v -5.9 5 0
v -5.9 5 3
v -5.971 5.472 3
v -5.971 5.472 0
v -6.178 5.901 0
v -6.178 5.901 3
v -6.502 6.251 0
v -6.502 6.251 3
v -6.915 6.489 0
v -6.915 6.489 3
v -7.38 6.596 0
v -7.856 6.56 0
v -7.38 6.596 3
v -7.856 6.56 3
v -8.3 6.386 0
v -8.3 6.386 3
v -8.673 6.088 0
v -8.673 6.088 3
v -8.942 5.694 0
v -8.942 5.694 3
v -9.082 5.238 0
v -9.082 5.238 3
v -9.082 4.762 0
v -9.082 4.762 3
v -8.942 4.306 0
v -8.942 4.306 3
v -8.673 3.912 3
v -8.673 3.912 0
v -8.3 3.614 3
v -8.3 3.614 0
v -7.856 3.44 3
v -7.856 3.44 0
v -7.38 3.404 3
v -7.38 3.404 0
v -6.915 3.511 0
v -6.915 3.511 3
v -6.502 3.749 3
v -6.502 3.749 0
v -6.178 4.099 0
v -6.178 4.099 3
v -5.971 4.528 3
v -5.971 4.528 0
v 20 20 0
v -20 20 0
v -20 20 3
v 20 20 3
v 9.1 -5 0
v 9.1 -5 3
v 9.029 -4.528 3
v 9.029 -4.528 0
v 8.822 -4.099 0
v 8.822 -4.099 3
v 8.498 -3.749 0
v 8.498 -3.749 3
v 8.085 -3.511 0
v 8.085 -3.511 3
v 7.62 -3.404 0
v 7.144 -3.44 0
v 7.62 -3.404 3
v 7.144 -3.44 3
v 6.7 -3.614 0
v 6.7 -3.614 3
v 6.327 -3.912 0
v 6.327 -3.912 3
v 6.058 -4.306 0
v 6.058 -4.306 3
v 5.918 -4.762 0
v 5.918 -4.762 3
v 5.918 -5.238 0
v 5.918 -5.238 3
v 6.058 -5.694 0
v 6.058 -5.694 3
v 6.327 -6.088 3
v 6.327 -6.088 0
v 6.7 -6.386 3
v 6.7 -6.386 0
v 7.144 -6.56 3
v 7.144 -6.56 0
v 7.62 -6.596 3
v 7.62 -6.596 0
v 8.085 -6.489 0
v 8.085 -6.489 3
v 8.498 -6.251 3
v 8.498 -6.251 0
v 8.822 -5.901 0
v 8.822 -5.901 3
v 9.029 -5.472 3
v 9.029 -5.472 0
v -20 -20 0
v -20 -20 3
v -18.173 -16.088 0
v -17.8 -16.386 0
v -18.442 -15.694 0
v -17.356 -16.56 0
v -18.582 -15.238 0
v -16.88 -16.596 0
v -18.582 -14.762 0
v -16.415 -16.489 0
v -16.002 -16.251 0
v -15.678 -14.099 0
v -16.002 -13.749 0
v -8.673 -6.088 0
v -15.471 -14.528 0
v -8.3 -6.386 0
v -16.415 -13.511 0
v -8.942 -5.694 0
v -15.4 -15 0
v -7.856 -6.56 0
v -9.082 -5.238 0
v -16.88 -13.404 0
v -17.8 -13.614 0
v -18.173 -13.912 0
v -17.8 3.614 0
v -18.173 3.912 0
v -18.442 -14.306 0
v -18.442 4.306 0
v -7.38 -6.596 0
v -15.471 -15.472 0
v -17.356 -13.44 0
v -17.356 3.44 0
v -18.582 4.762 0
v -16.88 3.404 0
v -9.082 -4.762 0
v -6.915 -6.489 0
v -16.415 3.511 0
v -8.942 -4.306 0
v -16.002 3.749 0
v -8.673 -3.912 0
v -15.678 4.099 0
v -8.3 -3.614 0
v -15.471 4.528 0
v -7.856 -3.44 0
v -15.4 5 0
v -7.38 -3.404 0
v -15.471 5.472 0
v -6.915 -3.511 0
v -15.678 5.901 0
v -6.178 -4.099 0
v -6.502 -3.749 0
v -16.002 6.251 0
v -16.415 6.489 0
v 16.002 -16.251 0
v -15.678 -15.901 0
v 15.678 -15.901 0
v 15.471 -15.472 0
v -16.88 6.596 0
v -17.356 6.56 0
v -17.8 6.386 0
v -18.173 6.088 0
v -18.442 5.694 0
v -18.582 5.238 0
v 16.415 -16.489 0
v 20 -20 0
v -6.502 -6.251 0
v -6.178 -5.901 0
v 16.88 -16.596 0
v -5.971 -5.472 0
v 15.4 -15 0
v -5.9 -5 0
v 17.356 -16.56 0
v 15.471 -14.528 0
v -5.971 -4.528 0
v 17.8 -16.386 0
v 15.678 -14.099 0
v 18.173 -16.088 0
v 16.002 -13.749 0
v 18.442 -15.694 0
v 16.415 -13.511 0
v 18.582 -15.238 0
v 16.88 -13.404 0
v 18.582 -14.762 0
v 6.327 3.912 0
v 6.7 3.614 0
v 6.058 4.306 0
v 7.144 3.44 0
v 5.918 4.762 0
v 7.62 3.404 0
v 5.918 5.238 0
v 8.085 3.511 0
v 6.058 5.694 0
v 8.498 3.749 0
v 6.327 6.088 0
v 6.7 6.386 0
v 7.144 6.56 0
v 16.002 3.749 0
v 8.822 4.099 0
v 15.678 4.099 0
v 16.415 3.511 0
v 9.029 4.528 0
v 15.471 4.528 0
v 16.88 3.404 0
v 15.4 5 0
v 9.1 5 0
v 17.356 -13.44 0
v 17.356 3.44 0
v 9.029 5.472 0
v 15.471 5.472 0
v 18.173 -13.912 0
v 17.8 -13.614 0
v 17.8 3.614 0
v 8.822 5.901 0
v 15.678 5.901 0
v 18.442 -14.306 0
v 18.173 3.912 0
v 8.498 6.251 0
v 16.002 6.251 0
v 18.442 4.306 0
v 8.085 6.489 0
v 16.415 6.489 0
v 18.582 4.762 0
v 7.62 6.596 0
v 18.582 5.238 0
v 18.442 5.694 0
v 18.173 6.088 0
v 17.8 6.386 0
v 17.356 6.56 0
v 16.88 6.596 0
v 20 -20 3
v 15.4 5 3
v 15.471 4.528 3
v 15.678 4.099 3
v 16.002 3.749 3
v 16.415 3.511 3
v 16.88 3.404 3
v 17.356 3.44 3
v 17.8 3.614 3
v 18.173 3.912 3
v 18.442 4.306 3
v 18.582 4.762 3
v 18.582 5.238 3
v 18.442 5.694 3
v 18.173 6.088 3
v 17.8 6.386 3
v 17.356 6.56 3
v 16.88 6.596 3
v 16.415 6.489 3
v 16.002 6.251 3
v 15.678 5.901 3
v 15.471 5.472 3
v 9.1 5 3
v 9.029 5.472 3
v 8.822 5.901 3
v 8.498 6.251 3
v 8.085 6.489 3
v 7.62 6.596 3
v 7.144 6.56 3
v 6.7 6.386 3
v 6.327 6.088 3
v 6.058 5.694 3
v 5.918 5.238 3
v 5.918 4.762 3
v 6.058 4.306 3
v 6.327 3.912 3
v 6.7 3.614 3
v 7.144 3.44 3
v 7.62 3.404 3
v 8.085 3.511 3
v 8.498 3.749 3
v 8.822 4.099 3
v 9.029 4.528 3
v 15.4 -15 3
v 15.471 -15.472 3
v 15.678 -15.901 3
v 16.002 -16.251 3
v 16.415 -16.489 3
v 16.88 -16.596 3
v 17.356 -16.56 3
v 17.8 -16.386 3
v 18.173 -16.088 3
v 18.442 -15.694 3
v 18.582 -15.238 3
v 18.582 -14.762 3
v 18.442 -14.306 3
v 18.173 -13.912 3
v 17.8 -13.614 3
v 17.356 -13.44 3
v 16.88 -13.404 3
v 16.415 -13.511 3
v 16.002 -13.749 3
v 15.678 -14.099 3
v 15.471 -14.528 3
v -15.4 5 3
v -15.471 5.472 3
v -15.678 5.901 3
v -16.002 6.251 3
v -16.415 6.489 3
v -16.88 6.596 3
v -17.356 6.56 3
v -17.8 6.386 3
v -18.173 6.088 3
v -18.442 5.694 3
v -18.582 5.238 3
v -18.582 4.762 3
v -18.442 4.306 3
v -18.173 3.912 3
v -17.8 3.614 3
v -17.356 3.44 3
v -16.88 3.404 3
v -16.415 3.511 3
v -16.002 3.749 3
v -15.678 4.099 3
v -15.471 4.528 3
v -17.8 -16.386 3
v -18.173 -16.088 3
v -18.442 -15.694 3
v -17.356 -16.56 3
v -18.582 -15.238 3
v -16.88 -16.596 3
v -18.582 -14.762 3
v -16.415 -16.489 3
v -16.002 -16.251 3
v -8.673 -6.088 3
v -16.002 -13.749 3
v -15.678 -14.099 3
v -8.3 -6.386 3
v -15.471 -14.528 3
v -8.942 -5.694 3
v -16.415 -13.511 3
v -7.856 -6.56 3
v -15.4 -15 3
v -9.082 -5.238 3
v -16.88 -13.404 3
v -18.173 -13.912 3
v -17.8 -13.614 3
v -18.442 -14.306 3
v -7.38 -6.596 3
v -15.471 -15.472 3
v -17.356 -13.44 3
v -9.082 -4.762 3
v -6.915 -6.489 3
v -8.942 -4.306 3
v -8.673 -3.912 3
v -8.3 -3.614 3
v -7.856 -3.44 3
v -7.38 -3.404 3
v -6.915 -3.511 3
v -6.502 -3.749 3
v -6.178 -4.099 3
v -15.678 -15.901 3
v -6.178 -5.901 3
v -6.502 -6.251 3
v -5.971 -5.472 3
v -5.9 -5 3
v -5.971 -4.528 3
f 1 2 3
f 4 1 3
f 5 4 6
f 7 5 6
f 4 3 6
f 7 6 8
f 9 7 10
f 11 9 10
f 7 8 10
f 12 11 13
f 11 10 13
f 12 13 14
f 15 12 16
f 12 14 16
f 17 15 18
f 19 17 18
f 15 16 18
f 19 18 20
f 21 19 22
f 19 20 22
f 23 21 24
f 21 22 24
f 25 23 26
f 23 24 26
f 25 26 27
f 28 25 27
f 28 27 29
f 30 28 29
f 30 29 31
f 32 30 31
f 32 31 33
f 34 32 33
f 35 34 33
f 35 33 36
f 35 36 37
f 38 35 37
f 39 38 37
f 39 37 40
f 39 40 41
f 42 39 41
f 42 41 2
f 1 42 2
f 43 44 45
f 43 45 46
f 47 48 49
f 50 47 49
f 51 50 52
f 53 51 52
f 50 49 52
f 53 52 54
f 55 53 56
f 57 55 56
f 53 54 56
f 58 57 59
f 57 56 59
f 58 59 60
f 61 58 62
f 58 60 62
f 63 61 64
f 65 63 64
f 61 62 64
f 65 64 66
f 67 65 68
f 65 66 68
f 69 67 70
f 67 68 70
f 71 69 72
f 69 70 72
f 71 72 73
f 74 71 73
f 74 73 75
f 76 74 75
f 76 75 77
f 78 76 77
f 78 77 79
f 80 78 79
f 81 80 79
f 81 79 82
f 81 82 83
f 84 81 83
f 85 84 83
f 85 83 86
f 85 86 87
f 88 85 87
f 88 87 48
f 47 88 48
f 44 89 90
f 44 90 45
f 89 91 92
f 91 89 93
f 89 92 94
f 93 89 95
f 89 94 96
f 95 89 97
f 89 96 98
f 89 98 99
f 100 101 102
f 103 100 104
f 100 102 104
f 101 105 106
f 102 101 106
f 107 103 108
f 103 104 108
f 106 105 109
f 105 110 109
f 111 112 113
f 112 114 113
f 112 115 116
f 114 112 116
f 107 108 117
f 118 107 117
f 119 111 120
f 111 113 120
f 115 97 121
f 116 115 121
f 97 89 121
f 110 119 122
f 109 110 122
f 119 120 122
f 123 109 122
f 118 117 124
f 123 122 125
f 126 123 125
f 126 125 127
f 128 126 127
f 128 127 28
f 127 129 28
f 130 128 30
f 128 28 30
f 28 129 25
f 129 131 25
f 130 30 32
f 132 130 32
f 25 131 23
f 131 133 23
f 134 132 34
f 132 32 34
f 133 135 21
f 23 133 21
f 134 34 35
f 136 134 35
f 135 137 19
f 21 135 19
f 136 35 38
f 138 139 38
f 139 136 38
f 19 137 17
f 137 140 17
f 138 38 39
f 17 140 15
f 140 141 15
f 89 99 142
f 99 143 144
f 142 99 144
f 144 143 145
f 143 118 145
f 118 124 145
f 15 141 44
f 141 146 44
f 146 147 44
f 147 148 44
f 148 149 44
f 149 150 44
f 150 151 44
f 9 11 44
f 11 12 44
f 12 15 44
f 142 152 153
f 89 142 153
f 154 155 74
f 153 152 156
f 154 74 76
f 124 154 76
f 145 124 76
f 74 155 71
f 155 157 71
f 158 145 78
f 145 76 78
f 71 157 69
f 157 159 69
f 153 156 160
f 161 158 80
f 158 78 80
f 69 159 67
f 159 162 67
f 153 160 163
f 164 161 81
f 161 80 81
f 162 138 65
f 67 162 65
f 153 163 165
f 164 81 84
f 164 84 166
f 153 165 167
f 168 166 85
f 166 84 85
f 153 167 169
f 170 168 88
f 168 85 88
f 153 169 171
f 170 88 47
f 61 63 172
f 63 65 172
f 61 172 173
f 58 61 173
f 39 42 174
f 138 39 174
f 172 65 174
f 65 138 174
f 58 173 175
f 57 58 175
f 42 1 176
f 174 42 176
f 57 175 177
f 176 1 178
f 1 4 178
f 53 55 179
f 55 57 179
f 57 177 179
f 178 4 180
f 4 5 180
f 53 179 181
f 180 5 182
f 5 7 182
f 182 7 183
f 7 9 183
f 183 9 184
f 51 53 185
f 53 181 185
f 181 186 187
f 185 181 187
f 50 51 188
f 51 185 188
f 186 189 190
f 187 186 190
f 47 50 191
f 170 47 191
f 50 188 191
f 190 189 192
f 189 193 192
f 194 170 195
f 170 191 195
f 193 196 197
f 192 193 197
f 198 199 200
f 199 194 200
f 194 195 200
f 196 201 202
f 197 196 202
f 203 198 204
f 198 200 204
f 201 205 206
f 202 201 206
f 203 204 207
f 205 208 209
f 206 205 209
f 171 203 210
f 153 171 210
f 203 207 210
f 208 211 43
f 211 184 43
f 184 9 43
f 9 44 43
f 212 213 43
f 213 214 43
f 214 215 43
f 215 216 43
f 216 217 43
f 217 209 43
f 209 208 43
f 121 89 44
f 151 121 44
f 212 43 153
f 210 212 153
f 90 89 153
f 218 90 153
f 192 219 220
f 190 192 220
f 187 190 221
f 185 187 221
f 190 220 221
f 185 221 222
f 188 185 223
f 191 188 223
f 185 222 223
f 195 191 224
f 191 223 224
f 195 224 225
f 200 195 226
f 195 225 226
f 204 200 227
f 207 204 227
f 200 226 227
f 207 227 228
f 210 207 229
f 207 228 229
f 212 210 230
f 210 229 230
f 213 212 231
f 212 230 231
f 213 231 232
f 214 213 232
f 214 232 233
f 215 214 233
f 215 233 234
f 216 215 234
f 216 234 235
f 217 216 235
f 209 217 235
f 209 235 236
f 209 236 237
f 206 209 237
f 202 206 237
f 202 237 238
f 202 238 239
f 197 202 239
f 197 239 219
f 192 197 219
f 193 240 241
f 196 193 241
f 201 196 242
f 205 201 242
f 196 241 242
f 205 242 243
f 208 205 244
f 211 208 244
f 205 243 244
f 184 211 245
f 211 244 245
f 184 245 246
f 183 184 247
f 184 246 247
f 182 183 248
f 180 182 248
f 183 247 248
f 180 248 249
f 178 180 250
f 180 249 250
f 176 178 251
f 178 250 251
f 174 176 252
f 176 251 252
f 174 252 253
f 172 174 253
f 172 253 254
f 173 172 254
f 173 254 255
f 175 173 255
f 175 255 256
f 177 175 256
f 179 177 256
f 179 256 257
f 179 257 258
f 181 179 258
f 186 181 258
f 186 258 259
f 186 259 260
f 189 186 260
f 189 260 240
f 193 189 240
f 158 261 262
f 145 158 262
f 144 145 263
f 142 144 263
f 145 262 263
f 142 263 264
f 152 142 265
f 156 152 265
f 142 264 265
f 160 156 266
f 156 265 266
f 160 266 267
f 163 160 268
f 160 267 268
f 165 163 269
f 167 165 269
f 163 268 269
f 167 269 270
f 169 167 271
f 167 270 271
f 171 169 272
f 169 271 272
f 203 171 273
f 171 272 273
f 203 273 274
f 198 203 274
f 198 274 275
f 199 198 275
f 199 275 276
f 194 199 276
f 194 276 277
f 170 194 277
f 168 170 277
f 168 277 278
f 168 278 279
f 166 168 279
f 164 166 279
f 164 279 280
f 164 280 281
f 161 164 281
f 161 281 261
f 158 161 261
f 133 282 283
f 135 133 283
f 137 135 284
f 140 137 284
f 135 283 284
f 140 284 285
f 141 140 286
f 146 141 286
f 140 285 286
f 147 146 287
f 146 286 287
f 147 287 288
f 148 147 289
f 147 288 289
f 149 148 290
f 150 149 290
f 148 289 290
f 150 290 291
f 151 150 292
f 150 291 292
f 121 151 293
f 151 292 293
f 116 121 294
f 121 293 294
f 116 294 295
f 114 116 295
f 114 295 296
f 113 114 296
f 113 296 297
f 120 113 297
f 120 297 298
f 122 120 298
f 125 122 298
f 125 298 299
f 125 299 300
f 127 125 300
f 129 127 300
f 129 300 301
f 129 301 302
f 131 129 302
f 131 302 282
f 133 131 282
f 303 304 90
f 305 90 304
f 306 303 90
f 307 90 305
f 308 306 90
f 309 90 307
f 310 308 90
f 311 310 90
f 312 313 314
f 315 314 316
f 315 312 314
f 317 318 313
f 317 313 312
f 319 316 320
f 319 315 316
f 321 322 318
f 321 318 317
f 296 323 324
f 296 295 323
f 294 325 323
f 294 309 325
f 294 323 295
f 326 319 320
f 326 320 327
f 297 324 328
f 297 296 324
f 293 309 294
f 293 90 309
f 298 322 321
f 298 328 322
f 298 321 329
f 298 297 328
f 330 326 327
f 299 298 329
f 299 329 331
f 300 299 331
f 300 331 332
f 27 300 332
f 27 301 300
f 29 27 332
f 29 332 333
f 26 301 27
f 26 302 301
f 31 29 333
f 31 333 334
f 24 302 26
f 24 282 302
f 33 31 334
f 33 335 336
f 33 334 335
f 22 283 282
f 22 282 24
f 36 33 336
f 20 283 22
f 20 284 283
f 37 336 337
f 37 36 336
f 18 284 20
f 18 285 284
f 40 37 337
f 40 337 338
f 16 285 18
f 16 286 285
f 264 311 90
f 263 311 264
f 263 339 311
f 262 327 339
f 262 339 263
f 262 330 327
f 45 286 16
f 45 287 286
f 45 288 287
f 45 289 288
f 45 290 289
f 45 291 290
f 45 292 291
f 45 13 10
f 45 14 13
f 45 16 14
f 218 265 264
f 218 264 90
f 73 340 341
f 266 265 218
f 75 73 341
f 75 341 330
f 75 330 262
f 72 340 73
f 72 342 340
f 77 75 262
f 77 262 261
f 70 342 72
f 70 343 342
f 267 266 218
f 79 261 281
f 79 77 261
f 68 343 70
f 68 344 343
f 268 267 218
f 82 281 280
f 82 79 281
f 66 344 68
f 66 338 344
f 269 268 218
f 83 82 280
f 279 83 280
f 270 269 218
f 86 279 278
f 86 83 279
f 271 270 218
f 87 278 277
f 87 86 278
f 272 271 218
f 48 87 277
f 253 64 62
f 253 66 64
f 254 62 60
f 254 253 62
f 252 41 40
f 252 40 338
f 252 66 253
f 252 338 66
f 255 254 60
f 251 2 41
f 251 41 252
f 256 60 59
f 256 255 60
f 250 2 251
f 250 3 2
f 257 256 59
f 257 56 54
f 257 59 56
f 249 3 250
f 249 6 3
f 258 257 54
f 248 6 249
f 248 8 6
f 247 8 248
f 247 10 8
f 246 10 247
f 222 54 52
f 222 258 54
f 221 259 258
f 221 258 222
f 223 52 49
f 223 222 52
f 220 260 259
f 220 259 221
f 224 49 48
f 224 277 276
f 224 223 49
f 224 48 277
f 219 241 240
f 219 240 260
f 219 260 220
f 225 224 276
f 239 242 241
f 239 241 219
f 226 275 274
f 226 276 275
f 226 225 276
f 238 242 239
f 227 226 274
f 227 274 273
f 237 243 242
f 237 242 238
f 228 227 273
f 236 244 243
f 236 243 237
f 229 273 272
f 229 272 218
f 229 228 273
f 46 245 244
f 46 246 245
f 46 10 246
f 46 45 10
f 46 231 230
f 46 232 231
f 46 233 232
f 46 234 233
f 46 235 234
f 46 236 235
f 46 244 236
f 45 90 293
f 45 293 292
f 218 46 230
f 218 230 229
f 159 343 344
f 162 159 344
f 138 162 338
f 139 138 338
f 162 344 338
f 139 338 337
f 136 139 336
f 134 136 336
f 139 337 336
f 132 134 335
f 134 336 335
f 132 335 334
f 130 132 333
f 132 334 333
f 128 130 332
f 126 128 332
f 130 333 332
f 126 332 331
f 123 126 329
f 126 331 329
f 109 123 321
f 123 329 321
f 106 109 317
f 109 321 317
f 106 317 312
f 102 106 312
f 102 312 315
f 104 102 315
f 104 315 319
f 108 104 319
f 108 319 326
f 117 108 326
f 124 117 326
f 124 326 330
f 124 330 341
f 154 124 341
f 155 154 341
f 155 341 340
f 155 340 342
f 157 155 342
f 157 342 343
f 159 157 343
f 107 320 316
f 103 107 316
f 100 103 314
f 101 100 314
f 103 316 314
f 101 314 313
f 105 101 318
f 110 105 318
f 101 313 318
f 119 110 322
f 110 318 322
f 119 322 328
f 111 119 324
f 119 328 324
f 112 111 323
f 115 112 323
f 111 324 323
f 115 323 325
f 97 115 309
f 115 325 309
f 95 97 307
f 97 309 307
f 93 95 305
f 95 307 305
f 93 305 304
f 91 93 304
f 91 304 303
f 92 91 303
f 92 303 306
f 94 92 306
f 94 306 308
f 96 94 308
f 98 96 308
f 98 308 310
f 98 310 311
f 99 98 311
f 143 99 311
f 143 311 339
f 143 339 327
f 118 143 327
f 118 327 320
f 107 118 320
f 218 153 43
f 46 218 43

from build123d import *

# Parameters (mm, degrees)
SKETCH_1_W          = 40
SKETCH_1_H          = 40
EXTRUDE_1_DEPTH     = 3
SKETCH_2_R          = 1.6
CUT_EXTRUDE_1_DEPTH = 29.442925307


with BuildPart() as part:
    # 草图1 → 凸台-拉伸1 (new body)
    with BuildSketch(Plane.XY):
        Rectangle(SKETCH_1_W, SKETCH_1_H)
    extrude(amount=EXTRUDE_1_DEPTH)

    # 草图2 → 切除-拉伸1 (cut, through all)
    with BuildSketch(Plane.XY.offset(3)):
        with Locations((-7.5, 5)):
            Circle(SKETCH_2_R)
        with Locations((7.5, 5)):
            Circle(SKETCH_2_R)
        with Locations((7.5, -5)):
            Circle(SKETCH_2_R)
        with Locations((-7.5, -5)):
            Circle(SKETCH_2_R)
        with Locations((-17, -15)):
            Circle(SKETCH_2_R)
        with Locations((-17, 5)):
            Circle(SKETCH_2_R)
        with Locations(Location((17, 5, 0), (0, 0, 180))):
            Circle(SKETCH_2_R)
        with Locations(Location((17, -15, 0), (0, 0, 180))):
            Circle(SKETCH_2_R)
    extrude(amount=-CUT_EXTRUDE_1_DEPTH, mode=Mode.SUBTRACT)


solid = part.part
